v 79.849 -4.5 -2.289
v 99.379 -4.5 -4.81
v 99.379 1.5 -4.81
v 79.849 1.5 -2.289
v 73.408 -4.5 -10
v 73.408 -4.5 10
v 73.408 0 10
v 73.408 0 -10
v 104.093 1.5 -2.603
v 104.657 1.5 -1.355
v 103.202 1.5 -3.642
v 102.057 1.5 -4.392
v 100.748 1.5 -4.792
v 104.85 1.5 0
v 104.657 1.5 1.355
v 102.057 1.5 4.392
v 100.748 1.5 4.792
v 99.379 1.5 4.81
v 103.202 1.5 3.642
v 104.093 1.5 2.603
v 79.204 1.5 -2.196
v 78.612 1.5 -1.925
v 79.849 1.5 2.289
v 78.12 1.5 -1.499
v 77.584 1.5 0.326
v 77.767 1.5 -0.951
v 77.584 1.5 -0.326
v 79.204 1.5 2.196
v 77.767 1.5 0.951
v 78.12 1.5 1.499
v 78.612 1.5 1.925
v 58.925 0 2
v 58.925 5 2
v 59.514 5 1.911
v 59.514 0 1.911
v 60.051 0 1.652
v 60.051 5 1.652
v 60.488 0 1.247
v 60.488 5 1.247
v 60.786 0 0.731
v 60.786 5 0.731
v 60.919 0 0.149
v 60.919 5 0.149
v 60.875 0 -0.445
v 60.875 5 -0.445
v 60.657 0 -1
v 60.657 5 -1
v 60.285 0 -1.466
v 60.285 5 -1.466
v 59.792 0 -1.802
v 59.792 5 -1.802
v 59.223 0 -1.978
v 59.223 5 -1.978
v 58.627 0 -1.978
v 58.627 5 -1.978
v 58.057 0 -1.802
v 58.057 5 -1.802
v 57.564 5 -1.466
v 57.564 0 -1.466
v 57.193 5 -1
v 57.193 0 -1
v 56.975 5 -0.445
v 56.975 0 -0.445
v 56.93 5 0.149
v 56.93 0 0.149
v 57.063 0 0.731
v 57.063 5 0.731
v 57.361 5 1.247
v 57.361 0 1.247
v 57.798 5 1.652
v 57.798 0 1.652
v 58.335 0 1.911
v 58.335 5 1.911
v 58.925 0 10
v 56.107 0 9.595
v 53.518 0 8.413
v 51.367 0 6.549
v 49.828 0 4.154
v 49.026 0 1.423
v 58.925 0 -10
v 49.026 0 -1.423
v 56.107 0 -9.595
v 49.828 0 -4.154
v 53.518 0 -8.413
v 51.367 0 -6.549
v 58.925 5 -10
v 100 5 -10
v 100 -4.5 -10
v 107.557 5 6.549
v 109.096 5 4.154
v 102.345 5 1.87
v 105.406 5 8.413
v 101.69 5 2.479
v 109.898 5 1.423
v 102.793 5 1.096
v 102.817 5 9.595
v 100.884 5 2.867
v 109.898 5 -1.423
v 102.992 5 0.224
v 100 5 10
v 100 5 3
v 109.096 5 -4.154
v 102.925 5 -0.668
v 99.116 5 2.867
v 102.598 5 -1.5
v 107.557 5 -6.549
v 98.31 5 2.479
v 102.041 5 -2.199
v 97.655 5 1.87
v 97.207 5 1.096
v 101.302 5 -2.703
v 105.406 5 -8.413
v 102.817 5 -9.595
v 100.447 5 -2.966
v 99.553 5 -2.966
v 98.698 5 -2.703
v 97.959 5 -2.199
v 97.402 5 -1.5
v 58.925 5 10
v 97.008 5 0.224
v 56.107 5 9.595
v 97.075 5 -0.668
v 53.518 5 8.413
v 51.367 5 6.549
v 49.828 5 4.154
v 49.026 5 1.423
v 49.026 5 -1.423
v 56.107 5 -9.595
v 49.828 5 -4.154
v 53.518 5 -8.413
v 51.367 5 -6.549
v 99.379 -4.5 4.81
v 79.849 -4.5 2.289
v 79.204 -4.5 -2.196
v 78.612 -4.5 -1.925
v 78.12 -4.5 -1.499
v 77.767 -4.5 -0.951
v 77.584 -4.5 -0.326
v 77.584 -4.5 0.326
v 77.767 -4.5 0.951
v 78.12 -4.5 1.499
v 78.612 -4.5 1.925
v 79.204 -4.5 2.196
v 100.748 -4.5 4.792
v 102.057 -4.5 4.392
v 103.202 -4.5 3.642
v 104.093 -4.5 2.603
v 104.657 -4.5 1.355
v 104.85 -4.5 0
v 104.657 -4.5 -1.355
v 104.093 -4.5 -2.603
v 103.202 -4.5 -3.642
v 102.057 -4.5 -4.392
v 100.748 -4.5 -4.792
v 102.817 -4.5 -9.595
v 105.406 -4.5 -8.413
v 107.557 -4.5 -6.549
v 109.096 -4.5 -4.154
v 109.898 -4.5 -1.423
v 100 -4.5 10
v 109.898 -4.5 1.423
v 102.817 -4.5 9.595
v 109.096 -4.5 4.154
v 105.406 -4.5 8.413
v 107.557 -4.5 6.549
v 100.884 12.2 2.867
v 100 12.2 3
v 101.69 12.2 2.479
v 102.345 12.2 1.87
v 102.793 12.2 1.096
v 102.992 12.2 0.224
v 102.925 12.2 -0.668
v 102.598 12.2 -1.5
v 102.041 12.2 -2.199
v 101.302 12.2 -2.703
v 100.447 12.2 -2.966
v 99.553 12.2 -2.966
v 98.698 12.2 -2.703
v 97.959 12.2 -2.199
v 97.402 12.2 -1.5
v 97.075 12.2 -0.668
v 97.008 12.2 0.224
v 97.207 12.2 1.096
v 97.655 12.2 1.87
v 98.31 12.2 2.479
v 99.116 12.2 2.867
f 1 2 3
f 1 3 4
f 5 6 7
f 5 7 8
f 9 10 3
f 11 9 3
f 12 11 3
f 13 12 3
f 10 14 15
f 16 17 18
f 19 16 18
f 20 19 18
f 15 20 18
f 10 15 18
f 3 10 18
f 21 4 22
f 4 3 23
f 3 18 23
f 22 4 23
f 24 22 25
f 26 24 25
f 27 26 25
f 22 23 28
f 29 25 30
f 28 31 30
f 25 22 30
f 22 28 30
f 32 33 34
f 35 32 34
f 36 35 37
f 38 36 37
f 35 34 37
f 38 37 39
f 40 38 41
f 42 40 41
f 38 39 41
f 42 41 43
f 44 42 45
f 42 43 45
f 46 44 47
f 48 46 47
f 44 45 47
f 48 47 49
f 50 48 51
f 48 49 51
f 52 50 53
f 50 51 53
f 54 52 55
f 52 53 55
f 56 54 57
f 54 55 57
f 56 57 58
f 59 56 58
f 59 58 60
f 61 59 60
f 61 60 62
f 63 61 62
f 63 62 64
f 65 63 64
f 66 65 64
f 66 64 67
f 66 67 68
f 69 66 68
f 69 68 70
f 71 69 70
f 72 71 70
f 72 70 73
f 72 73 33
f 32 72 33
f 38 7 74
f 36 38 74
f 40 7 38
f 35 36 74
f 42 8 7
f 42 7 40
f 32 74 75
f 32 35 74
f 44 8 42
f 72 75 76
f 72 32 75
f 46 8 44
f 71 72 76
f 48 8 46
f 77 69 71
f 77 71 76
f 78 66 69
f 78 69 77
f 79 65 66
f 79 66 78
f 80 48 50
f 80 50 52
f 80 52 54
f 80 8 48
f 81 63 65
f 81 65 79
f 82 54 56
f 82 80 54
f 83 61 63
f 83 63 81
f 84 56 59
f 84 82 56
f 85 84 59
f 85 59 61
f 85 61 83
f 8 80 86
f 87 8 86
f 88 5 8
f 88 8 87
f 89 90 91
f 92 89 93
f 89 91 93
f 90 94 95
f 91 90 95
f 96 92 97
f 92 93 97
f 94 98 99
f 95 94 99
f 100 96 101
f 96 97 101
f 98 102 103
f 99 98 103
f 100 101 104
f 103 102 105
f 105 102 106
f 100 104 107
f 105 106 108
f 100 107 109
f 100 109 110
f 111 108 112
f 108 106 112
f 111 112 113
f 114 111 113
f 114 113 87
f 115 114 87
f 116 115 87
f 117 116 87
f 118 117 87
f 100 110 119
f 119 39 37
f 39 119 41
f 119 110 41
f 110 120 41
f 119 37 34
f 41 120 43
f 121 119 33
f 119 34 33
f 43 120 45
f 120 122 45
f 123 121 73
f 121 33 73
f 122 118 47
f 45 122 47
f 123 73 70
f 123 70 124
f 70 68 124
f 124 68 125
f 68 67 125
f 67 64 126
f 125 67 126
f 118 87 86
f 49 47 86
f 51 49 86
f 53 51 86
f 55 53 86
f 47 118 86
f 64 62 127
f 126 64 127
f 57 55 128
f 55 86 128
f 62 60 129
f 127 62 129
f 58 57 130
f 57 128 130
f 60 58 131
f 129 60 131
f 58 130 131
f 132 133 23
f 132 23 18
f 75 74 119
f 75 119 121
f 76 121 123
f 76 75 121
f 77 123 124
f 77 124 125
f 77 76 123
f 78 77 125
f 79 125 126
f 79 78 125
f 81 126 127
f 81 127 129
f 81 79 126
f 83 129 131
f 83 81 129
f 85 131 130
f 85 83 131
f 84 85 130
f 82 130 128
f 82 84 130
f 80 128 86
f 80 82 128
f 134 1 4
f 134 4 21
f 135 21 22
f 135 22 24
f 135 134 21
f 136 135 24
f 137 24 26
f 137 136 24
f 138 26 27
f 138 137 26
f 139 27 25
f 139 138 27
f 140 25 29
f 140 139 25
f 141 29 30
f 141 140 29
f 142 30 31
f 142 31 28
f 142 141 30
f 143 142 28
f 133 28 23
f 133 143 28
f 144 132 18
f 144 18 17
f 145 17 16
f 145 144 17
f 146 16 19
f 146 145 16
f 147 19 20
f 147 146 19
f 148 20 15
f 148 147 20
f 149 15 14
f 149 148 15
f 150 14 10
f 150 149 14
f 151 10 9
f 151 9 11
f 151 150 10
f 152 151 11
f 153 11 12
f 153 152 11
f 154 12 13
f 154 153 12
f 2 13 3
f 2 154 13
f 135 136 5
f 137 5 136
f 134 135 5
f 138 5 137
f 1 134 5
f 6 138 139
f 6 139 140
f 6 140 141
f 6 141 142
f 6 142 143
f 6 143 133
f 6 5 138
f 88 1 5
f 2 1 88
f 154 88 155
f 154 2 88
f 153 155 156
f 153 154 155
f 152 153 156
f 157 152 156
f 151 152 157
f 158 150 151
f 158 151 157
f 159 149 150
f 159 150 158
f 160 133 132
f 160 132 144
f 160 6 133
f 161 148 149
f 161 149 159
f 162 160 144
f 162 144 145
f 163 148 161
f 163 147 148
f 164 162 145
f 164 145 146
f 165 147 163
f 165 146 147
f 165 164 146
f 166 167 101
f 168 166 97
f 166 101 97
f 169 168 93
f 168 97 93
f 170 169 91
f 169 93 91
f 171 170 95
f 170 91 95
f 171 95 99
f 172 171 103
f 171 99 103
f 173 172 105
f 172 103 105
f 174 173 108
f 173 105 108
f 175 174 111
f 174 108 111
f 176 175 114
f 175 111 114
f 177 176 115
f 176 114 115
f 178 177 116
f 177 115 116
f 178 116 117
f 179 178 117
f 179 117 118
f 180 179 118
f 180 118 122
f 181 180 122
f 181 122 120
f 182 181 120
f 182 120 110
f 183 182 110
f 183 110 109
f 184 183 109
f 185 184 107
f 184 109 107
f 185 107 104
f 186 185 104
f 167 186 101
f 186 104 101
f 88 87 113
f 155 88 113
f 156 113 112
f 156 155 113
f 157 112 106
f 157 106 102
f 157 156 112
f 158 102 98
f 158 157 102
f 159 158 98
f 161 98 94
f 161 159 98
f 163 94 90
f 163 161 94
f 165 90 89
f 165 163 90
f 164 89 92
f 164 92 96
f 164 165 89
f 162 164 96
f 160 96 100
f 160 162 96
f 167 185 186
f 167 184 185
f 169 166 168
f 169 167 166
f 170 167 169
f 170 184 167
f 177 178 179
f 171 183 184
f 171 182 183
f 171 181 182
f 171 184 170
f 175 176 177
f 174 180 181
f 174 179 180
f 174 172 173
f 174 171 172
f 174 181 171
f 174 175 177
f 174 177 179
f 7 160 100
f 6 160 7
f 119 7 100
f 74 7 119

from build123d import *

# Parameters (mm, degrees)
SKETCH_1_R          = 2
EXTRUDE_1_DEPTH     = 5
SKETCH_2_R          = 3
EXTRUDE_2_DEPTH     = 10
EXTRUDE_START       = 4.5
EXTRUDE_3_DEPTH     = 4.5
CUT_EXTRUDE_1_DEPTH = 4.5
CUT_EXTRUDE_START   = -10
SKETCH_7_R          = 2
CUT_EXTRUDE_2_DEPTH = 10
SKETCH_8_R          = 2
CUT_EXTRUDE_3_DEPTH = 10
CUT_EXTRUDE_4_DEPTH = 6
SKETCH_10_W         = 23.139372947
SKETCH_10_H         = 31.36360791
CUT_EXTRUDE_7_DEPTH = 2.8


with BuildPart() as part:
    # 草图1 → 凸台-拉伸1 (new body)
    with BuildSketch(Plane(origin=(0, 0, 0), x_dir=(1, 0, 0), z_dir=(0, 1, 0))):
        with BuildLine():
            Line((0, 10), (100, 10))
            ThreePointArc((100, 10), (110, 0), (100, -10))
            Line((100, -10), (0, -10))
            ThreePointArc((0, -10), (-10, 0), (0, 10))
        make_face()
        with Locations(Location((0, 0, 0), (0, 0, 270))):
            Circle(SKETCH_1_R, mode=Mode.SUBTRACT)
    extrude(amount=EXTRUDE_1_DEPTH)

    # 草图2 → 凸台-拉伸2 (add)
    with BuildSketch(Plane(origin=(0, 5, 0), x_dir=(1, 0, 0), z_dir=(0, 1, 0))):
        with Locations(Location((100, 0, 0), (0, 0, 270))):
            Circle(SKETCH_2_R)
    extrude(amount=EXTRUDE_2_DEPTH)

    # 草图3 → 凸台-拉伸3 (add)
    with BuildSketch(Plane.XZ.offset(EXTRUDE_START)):
        with BuildLine():
            Line((100, 10), (73.40776322, 10))
            Line((73.40776322, 10), (73.40776322, -10))
            Line((73.40776322, -10), (100, -10))
            ThreePointArc((100, -10), (110, 0), (100, 10))
        make_face()
    extrude(amount=-EXTRUDE_3_DEPTH)

    # 草图4 → 切除-拉伸1 (cut)
    with BuildSketch(Plane.XZ.offset(4.5)):
        with BuildLine():
            Line((79.849230428, 2.288593229), (99.690178504, 3.236180981))
            ThreePointArc((99.690178504, 3.236180981), (103.250977807, 0), (99.690178504, -3.236180981))
            Line((99.690178504, -3.236180981), (79.849230428, -2.288593229))
            ThreePointArc((79.849230428, -2.288593229), (77.560637199, 0), (79.849230428, 2.288593229))
        make_face()
    extrude(amount=-CUT_EXTRUDE_1_DEPTH, mode=Mode.SUBTRACT)

    # 草图7 → 切除-拉伸2 (cut)
    with BuildSketch(Plane(origin=(0, 5, 0), x_dir=(1, 0, 0), z_dir=(0, 1, 0)).offset(CUT_EXTRUDE_START)):
        with BuildLine():
            ThreePointArc((58.924703642, -10), (48.924703642, 0), (58.924703642, 10))
            Line((58.924703642, 10), (0, 10))
            ThreePointArc((0, 10), (-10, 0), (0, -10))
            Line((0, -10), (58.924703642, -10))
        make_face()
        Circle(SKETCH_7_R, mode=Mode.SUBTRACT)
    extrude(amount=CUT_EXTRUDE_2_DEPTH, mode=Mode.SUBTRACT)

    # 草图8 → 切除-拉伸3 (cut)
    with BuildSketch(Plane(origin=(0, 5, 0), x_dir=(1, 0, 0), z_dir=(0, 1, 0))):
        with Locations(Location((58.924703642, 0, 0), (0, 0, 270))):
            Circle(SKETCH_8_R)
    extrude(amount=-CUT_EXTRUDE_3_DEPTH, mode=Mode.SUBTRACT)

    # 草图9 → 切除-拉伸4 (cut)
    with BuildSketch(Plane.XZ.offset(4.5)):
        with BuildLine():
            Line((79.849230428, 2.288593229), (99.378953737, 4.81012209))
            ThreePointArc((99.378953737, 4.81012209), (104.850048761, 0), (99.378953737, -4.81012209))
            Line((99.378953737, -4.81012209), (79.849230428, -2.288593229))
            ThreePointArc((79.849230428, -2.288593229), (77.560637199, 0), (79.849230428, 2.288593229))
        make_face()
    extrude(amount=-CUT_EXTRUDE_4_DEPTH, mode=Mode.SUBTRACT)

    # 草图10 → 切除-拉伸7 (cut)
    with BuildSketch(Plane(origin=(0, 15, 0), x_dir=(1, 0, 0), z_dir=(0, 1, 0))):
        with Locations((93.670893517, -8.00991687)):
            Rectangle(SKETCH_10_W, SKETCH_10_H)
    extrude(amount=-CUT_EXTRUDE_7_DEPTH, mode=Mode.SUBTRACT)


solid = part.part
